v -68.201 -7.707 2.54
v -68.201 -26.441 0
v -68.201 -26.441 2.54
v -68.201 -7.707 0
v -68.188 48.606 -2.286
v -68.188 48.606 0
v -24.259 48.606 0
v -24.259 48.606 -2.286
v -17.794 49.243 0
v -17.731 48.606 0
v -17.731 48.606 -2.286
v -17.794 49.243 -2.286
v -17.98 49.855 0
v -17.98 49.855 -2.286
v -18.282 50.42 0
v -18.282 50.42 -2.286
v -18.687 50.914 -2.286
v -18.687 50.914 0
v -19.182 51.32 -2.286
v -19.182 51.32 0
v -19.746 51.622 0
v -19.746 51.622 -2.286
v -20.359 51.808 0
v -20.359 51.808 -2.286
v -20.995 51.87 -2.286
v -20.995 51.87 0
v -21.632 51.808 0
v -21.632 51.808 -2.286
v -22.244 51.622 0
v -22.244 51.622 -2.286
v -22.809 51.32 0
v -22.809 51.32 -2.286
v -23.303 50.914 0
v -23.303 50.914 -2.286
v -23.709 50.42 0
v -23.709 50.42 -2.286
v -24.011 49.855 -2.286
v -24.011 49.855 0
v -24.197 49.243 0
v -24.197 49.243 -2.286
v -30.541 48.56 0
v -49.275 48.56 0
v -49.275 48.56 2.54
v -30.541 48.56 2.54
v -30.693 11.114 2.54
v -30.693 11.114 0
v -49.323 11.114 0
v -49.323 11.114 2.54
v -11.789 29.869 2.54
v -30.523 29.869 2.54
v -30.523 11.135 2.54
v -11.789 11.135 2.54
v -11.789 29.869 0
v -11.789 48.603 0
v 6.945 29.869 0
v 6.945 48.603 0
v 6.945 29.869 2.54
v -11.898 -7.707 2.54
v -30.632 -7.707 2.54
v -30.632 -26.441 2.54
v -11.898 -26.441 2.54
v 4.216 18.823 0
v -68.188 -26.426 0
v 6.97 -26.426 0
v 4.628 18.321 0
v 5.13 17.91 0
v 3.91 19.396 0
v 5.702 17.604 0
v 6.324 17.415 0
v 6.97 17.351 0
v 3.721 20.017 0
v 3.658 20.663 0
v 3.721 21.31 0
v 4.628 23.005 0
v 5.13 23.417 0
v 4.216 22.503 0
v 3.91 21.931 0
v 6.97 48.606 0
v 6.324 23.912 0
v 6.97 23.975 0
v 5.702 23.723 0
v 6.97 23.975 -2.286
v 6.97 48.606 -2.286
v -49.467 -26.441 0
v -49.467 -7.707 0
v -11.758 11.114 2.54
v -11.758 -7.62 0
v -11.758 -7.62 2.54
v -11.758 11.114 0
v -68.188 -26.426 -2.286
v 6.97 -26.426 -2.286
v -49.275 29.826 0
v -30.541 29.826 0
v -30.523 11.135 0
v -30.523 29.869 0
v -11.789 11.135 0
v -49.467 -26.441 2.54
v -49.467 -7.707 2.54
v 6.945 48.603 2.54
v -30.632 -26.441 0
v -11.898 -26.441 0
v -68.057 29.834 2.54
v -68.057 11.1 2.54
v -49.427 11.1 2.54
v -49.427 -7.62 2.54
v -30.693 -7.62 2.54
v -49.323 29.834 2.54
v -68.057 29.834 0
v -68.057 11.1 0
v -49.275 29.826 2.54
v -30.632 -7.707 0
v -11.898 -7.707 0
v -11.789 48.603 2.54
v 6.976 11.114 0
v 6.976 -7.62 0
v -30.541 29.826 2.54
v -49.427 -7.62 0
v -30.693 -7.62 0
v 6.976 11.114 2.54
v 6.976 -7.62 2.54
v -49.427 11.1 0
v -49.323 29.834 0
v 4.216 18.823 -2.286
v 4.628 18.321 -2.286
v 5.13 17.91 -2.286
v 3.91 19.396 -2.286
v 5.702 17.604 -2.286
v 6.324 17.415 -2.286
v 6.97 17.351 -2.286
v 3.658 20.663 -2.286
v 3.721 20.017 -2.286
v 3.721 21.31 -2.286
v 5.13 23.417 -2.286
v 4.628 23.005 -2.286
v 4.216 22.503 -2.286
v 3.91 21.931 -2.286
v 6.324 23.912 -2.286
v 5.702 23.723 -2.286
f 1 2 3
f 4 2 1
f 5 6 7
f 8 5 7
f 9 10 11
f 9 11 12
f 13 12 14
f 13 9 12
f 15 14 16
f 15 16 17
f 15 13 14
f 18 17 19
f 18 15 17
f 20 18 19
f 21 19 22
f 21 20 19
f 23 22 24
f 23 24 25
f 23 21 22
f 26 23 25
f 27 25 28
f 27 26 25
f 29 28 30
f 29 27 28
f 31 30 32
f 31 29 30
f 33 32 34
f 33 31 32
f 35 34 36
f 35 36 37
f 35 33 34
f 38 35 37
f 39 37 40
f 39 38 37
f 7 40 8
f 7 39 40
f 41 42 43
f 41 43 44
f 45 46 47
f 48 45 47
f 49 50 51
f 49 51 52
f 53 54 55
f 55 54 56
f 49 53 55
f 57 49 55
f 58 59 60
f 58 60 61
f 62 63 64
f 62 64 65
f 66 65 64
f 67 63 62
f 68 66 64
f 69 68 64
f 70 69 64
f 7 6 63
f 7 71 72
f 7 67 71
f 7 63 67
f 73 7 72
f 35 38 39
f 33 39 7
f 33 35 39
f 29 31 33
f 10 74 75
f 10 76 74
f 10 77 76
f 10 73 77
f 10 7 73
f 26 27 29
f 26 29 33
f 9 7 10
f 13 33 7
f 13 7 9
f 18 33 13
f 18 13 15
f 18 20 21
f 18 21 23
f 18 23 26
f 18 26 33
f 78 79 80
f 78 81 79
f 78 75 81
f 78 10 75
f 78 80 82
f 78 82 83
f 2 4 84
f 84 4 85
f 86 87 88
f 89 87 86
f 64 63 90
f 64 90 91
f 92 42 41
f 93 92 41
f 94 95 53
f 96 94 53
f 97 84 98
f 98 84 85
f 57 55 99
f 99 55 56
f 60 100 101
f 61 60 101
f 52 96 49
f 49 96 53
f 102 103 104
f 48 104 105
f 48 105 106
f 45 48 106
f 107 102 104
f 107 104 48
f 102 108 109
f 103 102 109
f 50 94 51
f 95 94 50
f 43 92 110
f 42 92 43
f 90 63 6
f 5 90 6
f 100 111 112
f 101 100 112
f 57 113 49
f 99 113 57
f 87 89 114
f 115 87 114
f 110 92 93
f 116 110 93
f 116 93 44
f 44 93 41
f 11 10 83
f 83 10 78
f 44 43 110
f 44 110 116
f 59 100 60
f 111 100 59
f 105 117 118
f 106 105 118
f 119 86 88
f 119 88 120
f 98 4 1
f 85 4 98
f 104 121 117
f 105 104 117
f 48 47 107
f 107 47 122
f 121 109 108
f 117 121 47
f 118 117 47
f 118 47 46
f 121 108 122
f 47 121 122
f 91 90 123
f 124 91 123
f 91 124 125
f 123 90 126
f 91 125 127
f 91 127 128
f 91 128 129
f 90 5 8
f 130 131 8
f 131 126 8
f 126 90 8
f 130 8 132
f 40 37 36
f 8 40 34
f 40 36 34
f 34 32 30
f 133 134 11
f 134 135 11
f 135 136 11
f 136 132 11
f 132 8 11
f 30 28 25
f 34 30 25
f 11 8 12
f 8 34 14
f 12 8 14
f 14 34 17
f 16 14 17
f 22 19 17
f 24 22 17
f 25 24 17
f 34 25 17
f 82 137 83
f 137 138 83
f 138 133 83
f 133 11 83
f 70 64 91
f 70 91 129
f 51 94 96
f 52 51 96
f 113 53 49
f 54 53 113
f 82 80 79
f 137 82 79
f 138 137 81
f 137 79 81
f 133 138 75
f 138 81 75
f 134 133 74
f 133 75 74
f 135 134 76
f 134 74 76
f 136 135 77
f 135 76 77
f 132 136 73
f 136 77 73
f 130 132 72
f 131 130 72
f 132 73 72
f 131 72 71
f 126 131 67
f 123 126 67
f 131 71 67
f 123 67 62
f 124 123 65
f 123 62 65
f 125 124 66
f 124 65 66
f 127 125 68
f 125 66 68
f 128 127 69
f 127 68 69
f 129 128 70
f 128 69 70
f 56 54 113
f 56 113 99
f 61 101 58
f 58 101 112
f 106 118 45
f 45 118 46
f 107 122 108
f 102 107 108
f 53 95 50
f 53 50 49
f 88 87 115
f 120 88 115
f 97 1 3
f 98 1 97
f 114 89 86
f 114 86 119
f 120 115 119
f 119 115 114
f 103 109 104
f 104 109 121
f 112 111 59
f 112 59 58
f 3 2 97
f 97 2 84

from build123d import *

# Parameters (mm, degrees)
F0_W     = 18.7340527773
F0_H     = 18.7340471894
F1_DEPTH = 2.54
F0_W_2   = 0.1046992838
F0_H_2   = 0.0142469071
F2_W     = 75.1572456211
F2_H     = 75.0327724963
F3_DEPTH = 2.286
F5_DEPTH = 25.4
F6_DEPTH = 2.286


with BuildPart() as f1:
    # F0 (on Top) → F1 (new body)
    with BuildSketch(Plane.XY):
        with Locations((-2.4223788641, 39.23638165)):
            Rectangle(F0_W, F0_H)
    extrude(amount=F1_DEPTH)


with BuildPart() as f1b:
    # F0 (on Top) → F1, piece 2 (new body)
    with BuildSketch(Plane.XY):
        with Locations((-21.265367046, -17.0743810013)):
            Rectangle(F0_W, F0_H)
    extrude(amount=F1_DEPTH)


with BuildPart() as f1c:
    # F0 (on Top) → F1, piece 3 (new body)
    with BuildSketch(Plane.XY):
        with Locations((-58.83359164, -17.073973082)):
            Rectangle(F0_W, F0_H)
    extrude(amount=F1_DEPTH)


with BuildPart() as f1d:
    # F0 (on Top) → F1, piece 4 (new body)
    with BuildSketch(Plane.XY):
        Polygon((-49.4274608791, 11.0997995362), (-49.4274608791, 11.1140464433), (-49.3227615952, 11.1140464433), (-49.3227615952, 29.8338467255), (-68.0568143725, 29.8338467255), (-68.0568143725, 11.0997995362), align=None)
        Polygon((-30.6934081018, 11.1140464433), (-49.3227615952, 11.1140464433), (-49.3227615952, 11.0997995362), (-49.4274608791, 11.0997995362), (-49.4274608791, -7.6200007461), (-30.6934081018, -7.6200007461), align=None)
        with Locations((-49.3751112372, 11.1069229897)):
            Rectangle(F0_W_2, F0_H_2)
    extrude(amount=F1_DEPTH)


with BuildPart() as f1e:
    # F0 (on Top) → F1, piece 5 (new body)
    with BuildSketch(Plane.XY):
        with Locations((-2.3914091289, 1.7470228486)):
            Rectangle(F0_W, F0_H)
    extrude(amount=F1_DEPTH)


with BuildPart() as f1f:
    # F0 (on Top) → F1, piece 6 (new body)
    with BuildSketch(Plane.XY):
        with Locations((-39.907887578, 39.1931300983)):
            Rectangle(F0_W, F0_H)
    extrude(amount=F1_DEPTH)


with BuildPart() as f1g:
    # F0 (on Top) → F1, piece 7 (new body)
    with BuildSketch(Plane.XY):
        with Locations((-21.1564316414, 20.5023344606)):
            Rectangle(F0_W, F0_H)
    extrude(amount=F1_DEPTH)


with BuildPart() as f3:
    # F2 (on Top) → F3 (new body)
    with BuildSketch(Plane.XY):
        with Locations((-30.6088821962, 11.0900280997)):
            Rectangle(F2_W, F2_H)
    extrude(amount=-F3_DEPTH)

    # F4 (on face) → F5 (cut)
    with BuildSketch(Plane.XY):
        with BuildLine():
            Line((6.9697406143, 17.3514315808), (6.9697406143, 23.9753789085))
            ThreePointArc((6.9697406143, 23.9753789085), (3.6577669504, 20.6634052446), (6.9697406143, 17.3514315808))
        make_face()
    extrude(amount=-F5_DEPTH, mode=Mode.SUBTRACT)

    # F4 (on face) → F6 (join)
    with BuildSketch(Plane.XY):
        with BuildLine():
            Line((-24.2592524755, 48.6064143479), (-17.7314524755, 48.6064143479))
            ThreePointArc((-17.7314524755, 48.6064143479), (-20.9953524755, 51.8703143479), (-24.2592524755, 48.6064143479))
        make_face()
    extrude(amount=-F6_DEPTH)


solid = Compound([f1.part, f1b.part, f1c.part, f1d.part, f1e.part, f1f.part, f1g.part, f3.part])
